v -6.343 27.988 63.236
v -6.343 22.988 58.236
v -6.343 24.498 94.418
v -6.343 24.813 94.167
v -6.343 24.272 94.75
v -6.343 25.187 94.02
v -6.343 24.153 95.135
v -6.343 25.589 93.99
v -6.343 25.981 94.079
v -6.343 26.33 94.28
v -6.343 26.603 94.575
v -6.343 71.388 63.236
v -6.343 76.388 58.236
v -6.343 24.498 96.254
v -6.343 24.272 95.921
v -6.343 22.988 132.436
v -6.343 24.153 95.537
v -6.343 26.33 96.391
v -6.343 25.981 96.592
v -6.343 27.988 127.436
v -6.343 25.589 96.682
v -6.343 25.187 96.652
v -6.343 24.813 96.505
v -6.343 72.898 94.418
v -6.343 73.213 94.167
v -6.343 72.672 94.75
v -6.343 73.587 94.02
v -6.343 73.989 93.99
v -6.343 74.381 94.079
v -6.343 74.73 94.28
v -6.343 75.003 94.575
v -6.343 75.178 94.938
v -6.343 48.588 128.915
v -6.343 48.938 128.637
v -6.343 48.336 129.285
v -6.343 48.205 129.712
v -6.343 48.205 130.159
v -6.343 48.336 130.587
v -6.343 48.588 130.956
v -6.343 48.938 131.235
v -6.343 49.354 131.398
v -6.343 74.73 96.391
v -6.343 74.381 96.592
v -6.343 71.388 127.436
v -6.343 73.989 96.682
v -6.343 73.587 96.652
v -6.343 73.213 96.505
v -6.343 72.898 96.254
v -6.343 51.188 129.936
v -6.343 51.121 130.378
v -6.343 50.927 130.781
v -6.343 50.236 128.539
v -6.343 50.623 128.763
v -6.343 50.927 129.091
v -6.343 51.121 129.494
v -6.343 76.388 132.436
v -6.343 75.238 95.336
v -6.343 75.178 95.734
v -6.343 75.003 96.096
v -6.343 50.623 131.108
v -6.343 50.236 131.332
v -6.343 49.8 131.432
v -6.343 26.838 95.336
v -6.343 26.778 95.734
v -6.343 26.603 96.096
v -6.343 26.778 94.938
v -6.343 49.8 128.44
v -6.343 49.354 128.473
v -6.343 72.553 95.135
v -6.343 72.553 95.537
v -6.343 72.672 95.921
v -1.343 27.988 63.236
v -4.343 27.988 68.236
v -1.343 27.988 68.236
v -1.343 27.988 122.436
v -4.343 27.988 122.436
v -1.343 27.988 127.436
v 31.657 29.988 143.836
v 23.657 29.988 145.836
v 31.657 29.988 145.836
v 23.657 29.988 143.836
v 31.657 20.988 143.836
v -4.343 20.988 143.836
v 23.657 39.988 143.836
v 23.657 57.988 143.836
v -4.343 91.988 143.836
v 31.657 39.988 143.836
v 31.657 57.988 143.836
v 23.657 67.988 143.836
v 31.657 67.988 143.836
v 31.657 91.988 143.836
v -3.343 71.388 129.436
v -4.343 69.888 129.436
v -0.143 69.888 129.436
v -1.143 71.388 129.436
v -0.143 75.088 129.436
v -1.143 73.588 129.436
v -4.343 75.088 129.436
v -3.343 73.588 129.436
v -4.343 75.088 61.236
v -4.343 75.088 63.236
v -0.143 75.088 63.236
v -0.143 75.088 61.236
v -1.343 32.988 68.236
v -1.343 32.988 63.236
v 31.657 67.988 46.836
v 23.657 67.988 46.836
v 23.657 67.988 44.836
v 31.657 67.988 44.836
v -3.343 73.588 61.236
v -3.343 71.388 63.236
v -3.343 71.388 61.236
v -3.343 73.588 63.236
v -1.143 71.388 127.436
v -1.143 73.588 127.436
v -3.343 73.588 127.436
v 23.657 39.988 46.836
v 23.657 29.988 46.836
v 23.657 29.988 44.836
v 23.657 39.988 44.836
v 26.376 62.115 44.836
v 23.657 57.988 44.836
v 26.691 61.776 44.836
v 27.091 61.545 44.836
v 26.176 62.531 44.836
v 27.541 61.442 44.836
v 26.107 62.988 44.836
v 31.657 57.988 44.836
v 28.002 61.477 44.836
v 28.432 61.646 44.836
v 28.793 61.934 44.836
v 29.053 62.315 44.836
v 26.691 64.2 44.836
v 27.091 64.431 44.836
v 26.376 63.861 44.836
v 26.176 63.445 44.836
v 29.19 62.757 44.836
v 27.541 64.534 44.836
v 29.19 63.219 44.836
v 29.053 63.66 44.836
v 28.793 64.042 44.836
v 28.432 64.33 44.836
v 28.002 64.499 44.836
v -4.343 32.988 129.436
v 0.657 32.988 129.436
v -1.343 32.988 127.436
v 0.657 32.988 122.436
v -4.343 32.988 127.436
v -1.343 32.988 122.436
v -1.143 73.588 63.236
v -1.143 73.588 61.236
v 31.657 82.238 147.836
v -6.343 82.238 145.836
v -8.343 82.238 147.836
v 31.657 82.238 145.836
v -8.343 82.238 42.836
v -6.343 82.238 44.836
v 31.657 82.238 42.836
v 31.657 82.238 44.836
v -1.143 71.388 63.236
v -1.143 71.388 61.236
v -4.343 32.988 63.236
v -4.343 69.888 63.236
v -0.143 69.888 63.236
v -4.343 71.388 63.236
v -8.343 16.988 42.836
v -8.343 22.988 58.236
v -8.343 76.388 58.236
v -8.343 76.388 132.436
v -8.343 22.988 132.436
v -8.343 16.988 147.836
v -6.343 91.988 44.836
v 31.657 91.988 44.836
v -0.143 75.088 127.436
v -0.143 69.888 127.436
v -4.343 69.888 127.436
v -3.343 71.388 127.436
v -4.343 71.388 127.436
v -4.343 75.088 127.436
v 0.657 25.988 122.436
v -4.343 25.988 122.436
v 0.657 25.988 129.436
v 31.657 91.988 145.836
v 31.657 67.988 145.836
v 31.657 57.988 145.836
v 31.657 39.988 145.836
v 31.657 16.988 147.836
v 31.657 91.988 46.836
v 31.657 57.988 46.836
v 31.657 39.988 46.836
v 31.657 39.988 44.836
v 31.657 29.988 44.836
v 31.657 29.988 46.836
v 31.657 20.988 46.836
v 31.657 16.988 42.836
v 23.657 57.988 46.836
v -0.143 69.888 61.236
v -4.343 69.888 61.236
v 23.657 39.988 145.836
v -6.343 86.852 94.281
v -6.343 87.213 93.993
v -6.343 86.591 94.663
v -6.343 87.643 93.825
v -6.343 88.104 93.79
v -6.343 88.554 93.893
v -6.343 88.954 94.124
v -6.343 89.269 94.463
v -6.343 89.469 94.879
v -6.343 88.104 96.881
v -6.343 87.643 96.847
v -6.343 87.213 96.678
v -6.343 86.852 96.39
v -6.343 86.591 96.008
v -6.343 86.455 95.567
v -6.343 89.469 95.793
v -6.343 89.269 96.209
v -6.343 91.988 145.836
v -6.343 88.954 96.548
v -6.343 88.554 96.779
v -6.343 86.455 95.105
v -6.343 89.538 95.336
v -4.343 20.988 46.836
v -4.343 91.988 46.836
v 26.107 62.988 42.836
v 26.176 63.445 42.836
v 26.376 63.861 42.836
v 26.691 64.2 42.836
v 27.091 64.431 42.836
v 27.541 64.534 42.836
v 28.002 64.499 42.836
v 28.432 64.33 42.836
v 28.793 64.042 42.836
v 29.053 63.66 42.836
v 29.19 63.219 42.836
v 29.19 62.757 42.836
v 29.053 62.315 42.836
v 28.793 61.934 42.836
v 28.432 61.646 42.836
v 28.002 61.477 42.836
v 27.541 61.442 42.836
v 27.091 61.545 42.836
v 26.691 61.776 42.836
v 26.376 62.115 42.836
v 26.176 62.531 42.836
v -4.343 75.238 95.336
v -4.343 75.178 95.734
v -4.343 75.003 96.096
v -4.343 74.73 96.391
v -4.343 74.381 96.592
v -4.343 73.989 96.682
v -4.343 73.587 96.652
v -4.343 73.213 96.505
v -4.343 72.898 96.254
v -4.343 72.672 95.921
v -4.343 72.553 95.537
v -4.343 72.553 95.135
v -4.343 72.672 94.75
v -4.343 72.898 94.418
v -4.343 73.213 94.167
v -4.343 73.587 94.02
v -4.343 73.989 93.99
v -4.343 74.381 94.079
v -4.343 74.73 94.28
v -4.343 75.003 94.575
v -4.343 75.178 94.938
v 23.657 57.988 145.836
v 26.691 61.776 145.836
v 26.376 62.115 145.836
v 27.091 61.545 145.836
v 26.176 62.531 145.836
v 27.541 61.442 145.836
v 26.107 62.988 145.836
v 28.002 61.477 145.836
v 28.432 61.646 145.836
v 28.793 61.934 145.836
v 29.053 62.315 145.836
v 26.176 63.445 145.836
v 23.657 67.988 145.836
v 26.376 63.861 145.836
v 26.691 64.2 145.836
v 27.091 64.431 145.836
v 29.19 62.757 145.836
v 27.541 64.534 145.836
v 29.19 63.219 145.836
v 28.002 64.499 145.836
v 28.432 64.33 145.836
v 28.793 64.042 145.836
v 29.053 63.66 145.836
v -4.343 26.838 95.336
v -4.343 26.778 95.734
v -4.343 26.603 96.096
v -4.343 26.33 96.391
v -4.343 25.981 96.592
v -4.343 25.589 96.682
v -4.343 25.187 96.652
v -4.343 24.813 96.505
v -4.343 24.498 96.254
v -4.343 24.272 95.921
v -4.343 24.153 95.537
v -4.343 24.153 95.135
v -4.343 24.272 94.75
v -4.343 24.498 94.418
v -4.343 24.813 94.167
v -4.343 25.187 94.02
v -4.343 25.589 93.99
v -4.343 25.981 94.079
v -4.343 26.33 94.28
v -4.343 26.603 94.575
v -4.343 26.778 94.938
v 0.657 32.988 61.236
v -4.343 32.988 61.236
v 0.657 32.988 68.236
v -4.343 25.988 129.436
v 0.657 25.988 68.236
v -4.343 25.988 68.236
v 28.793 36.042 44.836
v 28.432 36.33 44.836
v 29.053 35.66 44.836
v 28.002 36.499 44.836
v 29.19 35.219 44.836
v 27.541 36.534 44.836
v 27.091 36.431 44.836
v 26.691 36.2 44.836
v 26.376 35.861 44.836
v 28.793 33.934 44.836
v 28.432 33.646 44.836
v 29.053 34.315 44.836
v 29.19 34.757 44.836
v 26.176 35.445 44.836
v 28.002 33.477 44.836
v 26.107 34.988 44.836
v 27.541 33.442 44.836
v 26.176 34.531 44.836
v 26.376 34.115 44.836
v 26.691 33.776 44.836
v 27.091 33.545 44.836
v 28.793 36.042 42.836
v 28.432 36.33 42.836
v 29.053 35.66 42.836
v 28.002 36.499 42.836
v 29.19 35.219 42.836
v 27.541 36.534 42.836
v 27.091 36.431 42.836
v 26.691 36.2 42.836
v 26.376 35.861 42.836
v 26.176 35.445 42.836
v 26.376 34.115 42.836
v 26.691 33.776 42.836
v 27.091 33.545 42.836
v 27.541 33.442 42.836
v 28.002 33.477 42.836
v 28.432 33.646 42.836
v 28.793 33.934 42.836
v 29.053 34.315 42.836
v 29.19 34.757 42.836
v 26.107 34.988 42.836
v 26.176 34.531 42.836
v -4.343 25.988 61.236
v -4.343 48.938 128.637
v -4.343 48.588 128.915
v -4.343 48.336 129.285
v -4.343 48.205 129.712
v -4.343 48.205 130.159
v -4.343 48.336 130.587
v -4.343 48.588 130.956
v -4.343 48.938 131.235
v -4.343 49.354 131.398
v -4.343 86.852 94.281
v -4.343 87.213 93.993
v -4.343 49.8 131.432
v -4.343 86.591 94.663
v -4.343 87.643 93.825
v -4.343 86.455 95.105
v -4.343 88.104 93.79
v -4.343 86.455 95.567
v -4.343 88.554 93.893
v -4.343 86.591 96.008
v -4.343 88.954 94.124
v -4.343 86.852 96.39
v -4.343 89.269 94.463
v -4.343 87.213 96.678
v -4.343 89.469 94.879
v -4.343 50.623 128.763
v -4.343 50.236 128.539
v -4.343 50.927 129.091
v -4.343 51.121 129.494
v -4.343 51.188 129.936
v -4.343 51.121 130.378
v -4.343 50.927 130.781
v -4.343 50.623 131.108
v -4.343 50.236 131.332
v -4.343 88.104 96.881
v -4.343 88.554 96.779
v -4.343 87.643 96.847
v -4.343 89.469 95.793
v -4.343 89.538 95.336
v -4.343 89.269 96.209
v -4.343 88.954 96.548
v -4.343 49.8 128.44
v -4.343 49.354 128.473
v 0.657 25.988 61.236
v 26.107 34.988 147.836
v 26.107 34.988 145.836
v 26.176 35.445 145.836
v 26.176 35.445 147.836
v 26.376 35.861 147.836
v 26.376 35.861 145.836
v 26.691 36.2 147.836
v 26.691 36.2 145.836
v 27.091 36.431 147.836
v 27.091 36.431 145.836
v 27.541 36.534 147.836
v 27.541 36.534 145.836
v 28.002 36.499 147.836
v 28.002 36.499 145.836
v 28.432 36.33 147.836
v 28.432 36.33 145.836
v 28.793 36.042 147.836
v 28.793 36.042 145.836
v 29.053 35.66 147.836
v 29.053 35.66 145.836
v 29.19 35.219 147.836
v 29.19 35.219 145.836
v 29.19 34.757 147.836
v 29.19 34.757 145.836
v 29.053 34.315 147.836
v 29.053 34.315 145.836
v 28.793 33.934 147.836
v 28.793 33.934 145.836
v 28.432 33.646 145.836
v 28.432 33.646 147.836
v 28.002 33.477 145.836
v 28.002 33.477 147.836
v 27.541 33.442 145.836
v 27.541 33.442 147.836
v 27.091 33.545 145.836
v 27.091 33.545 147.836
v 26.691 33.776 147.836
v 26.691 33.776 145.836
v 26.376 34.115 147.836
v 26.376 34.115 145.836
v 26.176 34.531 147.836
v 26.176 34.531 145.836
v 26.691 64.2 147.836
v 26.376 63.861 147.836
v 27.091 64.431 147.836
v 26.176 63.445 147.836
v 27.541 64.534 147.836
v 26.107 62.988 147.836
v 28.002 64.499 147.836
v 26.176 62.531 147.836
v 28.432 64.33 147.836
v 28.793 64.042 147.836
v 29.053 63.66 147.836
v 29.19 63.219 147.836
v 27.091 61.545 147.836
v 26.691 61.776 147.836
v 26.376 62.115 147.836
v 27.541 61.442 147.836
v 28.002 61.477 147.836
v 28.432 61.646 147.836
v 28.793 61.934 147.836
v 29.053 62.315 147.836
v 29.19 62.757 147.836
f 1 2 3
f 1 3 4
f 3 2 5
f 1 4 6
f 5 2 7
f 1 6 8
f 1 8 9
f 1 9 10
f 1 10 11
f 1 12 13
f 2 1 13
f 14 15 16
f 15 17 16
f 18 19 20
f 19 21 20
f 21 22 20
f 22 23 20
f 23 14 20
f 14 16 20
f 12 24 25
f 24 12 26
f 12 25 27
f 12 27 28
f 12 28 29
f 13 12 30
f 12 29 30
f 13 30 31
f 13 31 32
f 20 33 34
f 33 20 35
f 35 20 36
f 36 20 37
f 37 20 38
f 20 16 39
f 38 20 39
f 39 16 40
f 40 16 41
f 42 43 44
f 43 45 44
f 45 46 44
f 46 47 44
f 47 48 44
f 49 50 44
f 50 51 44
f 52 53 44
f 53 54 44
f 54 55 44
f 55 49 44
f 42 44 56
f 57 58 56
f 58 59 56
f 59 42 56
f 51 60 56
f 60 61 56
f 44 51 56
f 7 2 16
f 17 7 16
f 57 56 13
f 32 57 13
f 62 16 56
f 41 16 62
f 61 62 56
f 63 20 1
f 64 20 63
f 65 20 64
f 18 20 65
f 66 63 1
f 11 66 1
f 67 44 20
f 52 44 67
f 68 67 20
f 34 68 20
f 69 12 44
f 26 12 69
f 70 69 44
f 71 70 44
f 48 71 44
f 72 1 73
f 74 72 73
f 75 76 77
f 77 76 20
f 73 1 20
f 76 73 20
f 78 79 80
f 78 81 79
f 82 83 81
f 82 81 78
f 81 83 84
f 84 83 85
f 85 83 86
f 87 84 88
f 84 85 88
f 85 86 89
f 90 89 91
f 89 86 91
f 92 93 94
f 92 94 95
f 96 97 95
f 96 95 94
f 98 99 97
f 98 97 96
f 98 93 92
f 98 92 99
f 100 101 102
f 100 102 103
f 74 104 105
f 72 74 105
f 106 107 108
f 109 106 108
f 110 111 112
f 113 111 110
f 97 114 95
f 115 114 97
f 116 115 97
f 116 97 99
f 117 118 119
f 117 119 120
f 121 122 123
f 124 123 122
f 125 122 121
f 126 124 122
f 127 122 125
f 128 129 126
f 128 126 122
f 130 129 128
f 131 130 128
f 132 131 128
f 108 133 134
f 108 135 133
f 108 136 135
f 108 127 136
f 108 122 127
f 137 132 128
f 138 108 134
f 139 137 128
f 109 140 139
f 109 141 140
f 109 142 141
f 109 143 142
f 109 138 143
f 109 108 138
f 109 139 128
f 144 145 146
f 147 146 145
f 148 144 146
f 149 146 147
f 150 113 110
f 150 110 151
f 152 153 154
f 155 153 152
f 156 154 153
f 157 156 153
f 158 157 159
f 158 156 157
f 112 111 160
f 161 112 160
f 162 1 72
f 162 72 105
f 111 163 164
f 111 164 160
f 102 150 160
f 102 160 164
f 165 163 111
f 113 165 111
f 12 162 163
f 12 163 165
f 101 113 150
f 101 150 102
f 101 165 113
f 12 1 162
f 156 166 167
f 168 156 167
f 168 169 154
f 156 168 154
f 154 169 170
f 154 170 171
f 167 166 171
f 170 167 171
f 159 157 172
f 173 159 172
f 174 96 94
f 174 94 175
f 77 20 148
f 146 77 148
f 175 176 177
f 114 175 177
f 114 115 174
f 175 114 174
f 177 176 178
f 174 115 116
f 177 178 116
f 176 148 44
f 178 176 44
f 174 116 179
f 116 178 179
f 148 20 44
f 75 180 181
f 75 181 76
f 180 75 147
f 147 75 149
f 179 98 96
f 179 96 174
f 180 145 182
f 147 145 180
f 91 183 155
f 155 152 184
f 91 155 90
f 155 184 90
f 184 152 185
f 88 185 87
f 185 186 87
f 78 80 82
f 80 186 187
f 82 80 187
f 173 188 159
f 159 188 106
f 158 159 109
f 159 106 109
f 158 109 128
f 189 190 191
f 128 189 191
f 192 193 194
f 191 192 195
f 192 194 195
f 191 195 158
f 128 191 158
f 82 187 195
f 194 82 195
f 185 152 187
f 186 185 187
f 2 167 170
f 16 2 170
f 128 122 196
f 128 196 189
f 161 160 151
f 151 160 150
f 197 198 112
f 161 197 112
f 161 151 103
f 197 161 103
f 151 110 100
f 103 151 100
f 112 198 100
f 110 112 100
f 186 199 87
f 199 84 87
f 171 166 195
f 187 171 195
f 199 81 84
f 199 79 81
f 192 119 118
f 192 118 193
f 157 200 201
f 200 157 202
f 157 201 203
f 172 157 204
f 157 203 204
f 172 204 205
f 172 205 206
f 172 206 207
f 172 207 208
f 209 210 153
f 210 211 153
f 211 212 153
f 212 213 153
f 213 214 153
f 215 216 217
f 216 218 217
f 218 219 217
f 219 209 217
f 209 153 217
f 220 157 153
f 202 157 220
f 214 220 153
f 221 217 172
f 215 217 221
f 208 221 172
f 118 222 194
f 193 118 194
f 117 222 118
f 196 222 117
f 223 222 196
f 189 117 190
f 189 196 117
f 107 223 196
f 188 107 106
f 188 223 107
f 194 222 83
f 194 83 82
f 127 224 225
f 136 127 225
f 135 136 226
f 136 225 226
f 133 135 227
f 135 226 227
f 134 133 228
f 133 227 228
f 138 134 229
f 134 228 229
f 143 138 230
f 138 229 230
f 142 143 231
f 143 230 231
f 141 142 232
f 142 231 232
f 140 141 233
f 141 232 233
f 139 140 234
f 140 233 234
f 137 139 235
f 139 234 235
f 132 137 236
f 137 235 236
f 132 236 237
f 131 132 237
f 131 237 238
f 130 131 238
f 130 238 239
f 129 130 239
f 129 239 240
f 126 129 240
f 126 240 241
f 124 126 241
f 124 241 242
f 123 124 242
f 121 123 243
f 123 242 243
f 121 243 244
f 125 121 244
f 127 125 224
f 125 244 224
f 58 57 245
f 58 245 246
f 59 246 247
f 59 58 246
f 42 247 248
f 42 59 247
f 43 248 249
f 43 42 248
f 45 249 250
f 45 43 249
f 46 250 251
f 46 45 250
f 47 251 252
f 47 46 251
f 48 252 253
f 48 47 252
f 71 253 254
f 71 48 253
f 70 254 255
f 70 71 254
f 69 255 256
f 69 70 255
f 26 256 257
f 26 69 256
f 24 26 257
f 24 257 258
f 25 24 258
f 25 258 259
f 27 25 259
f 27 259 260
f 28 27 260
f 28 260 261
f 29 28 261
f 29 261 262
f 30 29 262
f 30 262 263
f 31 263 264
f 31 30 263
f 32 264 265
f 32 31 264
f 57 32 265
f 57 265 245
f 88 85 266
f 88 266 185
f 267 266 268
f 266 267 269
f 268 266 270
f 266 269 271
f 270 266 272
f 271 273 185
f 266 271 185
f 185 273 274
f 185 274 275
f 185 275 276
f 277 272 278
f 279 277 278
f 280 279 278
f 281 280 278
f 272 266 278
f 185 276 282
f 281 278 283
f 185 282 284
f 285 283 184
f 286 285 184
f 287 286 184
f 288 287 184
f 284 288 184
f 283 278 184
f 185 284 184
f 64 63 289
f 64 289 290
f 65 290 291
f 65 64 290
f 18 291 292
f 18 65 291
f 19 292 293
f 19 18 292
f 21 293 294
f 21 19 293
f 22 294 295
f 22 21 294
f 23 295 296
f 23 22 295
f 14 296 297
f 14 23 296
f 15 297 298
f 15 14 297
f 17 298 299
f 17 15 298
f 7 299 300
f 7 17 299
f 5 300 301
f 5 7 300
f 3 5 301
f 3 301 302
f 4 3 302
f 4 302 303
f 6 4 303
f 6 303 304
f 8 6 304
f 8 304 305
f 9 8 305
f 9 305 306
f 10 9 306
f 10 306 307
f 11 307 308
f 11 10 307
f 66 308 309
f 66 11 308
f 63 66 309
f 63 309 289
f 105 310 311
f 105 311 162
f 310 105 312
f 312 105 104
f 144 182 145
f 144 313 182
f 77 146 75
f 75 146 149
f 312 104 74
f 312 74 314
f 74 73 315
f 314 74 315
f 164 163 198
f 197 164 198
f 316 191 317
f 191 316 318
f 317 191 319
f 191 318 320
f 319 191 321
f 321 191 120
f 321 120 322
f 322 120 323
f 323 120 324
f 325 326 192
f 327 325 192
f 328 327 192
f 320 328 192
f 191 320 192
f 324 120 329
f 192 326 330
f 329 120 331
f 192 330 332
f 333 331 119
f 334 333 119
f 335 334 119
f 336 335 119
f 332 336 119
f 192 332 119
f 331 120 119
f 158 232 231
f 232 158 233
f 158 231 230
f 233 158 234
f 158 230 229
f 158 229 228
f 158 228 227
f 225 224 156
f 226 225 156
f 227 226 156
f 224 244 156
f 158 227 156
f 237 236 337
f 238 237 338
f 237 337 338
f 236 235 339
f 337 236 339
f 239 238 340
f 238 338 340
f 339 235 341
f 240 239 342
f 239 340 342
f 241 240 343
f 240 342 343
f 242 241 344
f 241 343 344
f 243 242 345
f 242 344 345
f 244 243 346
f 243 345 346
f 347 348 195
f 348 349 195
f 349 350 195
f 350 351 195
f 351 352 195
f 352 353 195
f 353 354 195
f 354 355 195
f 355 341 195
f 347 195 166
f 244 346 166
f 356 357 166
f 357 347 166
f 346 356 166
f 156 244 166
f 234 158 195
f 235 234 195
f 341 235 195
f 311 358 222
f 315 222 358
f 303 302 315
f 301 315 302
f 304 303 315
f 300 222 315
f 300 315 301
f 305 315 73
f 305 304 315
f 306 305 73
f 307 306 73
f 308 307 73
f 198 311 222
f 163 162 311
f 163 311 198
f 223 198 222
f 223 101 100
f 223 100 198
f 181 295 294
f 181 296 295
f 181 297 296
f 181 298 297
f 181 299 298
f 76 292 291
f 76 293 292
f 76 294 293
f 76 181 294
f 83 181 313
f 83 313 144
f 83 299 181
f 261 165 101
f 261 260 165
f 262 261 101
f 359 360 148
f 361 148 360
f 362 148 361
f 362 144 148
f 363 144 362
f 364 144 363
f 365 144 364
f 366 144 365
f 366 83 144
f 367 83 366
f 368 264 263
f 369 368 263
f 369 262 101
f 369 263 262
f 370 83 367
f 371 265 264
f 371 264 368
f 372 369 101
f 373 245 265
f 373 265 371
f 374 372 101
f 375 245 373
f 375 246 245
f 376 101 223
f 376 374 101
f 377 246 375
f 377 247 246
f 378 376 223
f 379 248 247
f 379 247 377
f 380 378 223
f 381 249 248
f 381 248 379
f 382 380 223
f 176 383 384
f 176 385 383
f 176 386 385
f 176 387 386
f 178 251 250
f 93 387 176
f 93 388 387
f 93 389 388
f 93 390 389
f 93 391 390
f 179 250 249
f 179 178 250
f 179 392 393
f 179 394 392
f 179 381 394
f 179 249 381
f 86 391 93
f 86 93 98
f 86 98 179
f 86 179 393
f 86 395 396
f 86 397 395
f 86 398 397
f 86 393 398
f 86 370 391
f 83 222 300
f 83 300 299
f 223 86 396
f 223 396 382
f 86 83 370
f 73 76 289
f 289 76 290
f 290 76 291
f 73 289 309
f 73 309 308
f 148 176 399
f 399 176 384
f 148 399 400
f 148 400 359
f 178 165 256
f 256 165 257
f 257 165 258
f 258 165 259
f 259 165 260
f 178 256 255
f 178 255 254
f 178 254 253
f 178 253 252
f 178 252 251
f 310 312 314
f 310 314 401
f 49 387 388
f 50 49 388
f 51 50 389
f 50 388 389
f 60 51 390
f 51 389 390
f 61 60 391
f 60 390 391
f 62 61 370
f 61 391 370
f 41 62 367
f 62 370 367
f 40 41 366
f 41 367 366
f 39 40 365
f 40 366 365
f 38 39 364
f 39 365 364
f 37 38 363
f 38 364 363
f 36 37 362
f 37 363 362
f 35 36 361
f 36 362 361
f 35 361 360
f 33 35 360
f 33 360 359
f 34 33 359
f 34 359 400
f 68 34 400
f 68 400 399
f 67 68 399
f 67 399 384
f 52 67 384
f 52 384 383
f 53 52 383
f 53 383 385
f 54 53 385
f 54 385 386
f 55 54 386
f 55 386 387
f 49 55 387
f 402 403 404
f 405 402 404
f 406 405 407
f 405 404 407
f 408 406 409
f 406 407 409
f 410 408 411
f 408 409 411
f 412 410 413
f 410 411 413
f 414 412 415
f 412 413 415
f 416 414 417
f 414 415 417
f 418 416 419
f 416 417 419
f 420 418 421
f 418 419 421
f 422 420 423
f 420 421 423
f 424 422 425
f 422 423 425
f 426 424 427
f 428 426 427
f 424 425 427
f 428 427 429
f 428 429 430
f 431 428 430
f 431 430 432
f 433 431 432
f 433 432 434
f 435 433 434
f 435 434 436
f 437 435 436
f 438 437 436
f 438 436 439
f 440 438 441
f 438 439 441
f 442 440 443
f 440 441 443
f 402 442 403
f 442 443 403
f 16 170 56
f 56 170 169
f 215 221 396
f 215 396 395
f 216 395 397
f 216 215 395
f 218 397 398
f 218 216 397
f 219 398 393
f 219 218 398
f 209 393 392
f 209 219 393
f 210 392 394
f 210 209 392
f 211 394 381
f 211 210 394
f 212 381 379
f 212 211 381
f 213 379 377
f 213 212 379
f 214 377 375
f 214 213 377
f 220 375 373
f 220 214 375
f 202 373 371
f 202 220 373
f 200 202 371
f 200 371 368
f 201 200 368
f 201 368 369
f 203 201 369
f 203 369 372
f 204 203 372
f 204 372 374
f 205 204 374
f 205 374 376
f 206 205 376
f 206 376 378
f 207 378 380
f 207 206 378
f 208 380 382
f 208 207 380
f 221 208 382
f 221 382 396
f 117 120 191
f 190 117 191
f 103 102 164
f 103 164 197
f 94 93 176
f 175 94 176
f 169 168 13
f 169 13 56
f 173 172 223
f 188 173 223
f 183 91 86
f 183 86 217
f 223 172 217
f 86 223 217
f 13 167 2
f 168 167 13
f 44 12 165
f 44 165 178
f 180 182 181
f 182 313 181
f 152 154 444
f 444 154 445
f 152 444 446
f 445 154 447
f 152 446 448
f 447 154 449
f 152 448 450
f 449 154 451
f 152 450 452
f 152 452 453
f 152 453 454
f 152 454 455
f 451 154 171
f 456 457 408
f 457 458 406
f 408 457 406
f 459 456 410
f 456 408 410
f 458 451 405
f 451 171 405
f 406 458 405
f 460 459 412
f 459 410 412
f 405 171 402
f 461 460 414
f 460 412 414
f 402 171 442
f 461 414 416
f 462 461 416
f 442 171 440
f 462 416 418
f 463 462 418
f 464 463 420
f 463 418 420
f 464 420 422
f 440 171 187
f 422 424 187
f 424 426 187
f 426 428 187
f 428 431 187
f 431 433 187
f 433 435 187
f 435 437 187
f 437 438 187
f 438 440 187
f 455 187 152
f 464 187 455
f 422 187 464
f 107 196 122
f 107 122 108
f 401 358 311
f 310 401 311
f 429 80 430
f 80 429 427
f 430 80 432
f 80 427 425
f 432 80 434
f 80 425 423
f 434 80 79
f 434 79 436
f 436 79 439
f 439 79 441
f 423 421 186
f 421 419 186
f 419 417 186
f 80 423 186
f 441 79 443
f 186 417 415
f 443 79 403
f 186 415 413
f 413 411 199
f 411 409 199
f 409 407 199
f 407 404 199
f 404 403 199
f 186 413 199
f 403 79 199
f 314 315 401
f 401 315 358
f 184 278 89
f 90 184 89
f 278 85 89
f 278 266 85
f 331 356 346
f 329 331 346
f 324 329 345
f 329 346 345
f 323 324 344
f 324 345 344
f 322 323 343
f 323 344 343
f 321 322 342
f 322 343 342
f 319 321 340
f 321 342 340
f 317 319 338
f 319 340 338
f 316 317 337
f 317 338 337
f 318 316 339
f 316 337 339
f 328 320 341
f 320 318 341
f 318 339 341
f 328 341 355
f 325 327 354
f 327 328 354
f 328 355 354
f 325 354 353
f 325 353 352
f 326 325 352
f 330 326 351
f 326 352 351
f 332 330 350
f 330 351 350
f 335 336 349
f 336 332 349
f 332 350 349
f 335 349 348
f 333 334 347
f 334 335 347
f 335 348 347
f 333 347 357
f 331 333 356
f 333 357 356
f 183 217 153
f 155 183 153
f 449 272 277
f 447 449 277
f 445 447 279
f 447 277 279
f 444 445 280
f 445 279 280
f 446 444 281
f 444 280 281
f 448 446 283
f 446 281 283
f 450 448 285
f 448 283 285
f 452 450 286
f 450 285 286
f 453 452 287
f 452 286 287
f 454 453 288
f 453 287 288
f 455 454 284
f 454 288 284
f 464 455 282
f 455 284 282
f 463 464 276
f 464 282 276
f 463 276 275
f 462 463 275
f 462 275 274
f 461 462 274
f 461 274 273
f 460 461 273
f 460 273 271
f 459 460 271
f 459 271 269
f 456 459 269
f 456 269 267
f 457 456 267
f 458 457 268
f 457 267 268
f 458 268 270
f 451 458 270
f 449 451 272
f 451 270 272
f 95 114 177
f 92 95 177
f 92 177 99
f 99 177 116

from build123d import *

# Parameters (mm, degrees)
COMBINE1_START         = -8.34304364
COMBINE1_DEPTH         = 32
COMBINE1_START_2       = -6.34304364
COMBINE1_2_OUTLINE_R   = 1.35
COMBINE1_2_OUTLINE_W   = 43.4
COMBINE1_2_OUTLINE_H   = 64.2
COMBINE1_2_OUTLINE_R_2 = 1.55
COMBINE1_2_DEPTH       = 2
COMBINE1_3_OUTLINE_W   = 61.2
COMBINE1_3_OUTLINE_H   = 97
COMBINE1_3_OUTLINE_W_2 = 53.4
COMBINE1_3_OUTLINE_H_2 = 74.2
COMBINE1_3_DEPTH       = 2
COMBINE1_START_3       = -4.34304364
COMBINE1_4_DEPTH       = 30.4499999
COMBINE1_START_4       = 29.20695646
COMBINE1_5_DEPTH       = 2.4499999
COMBINE1_START_5       = 23.65695636
COMBINE1_6_OUTLINE_W   = 9.8
COMBINE1_6_OUTLINE_H   = 2
COMBINE1_6_DEPTH       = 8
COMBINE1_START_6       = 42.835743365
COMBINE1_7_OUTLINE_W   = 3.1000002
COMBINE1_7_OUTLINE_H   = 4
COMBINE1_7_DEPTH       = 105
COMBINE1_8_OUTLINE_W   = 3.1000002
COMBINE1_8_OUTLINE_H   = 18
COMBINE1_8_OUTLINE_H_2 = 14.2
COMBINE1_8_OUTLINE_H_3 = 9
COMBINE1_8_DEPTH       = 4
COMBINE1_START_7       = 143.835743365
COMBINE1_9_OUTLINE_W   = 3.1000002
COMBINE1_9_OUTLINE_H   = 18
COMBINE1_9_OUTLINE_H_2 = 14.2
COMBINE1_9_OUTLINE_H_3 = 9
COMBINE1_9_DEPTH       = 4
COMBINE1_10_DEPTH      = 2
COMBINE1_START_8       = 145.835743365
COMBINE1_11_DEPTH      = 2
CUT_EXTRUDE1_REACH     = 179.801
SKETCH2_R              = 1.5
BOSS_EXTRUDE1_DEPTH    = 3
SKETCH4_W              = 7
SKETCH4_H              = 7
BOSS_EXTRUDE2_DEPTH    = 2
SKETCH5_W              = 2
SKETCH5_H              = 5.2
BOSS_EXTRUDE3_DEPTH    = 4.2
CUT_EXTRUDE2_REACH     = 130.923
SKETCH6_W              = 2.2
SKETCH6_H              = 2.2
CUT_EXTRUDE3_REACH     = 130.923
SKETCH7_W              = 2.2
SKETCH7_H              = 2.2
SKETCH8_W              = 2
SKETCH8_H              = 101
BOSS_EXTRUDE4_DEPTH    = 0.05


with BuildPart() as part:
    # Combine1: read off the stored shape, not the designer's step
    # Combine1 outline → Combine1 (new body)
    with BuildSketch(Plane.YZ.offset(COMBINE1_START)):
        Polygon((82.18784428, 42.835743365), (82.18784428, 46.835743365), (20.98784428, 46.835743365), (20.98784428, 143.835743365), (82.18784428, 143.835743365), (82.18784428, 147.835743365), (16.98784428, 147.835743365), (16.98784428, 42.835743365), align=None)
    extrude(amount=COMBINE1_DEPTH)

    # Combine1 2 outline → Combine1 2 (add)
    with BuildSketch(Plane.YZ.offset(COMBINE1_START_2)):
        Polygon((82.18784428, 46.835743365), (82.18784428, 44.835743365), (91.98784428, 44.835743365), (91.98784428, 145.835743365), (82.18784428, 145.835743365), (82.18784428, 143.835743365), (20.98784428, 143.835743365), (20.98784428, 46.835743365), align=None)
        with Locations((25.48784428, 95.335743365)):
            Circle(COMBINE1_2_OUTLINE_R, mode=Mode.SUBTRACT)
        with Locations((49.68784428, 95.335743365)):
            Rectangle(COMBINE1_2_OUTLINE_W, COMBINE1_2_OUTLINE_H, mode=Mode.SUBTRACT)
        with Locations((73.88784428, 95.335743365)):
            Circle(COMBINE1_2_OUTLINE_R, mode=Mode.SUBTRACT)
        with Locations((87.98784428, 95.335743365)):
            Circle(COMBINE1_2_OUTLINE_R_2, mode=Mode.SUBTRACT)
    extrude(amount=COMBINE1_2_DEPTH)

    # Combine1 3 outline → Combine1 3 (add)
    with BuildSketch(Plane.YZ.offset(COMBINE1_START)):
        with Locations((51.58784428, 95.335743365)):
            Rectangle(COMBINE1_3_OUTLINE_W, COMBINE1_3_OUTLINE_H)
        with Locations((49.68784428, 95.335743365)):
            Rectangle(COMBINE1_3_OUTLINE_W_2, COMBINE1_3_OUTLINE_H_2, mode=Mode.SUBTRACT)
    extrude(amount=COMBINE1_3_DEPTH)

    # Combine1 4 outline → Combine1 4 (add)
    with BuildSketch(Plane.YZ.offset(COMBINE1_START_3)):
        Polygon((82.18784428, 44.835743365), (91.98784428, 44.835743365), (91.98784428, 46.835743365), (67.98784428, 46.835743365), (67.98784428, 44.835743365), (57.98784428, 44.835743365), (57.98784428, 46.835743365), (39.98784428, 46.835743365), (39.98784428, 44.835743365), (29.98784428, 44.835743365), (29.98784428, 46.835743365), (20.98784428, 46.835743365), (20.98784428, 143.835743365), (29.98784428, 143.835743365), (29.98784428, 145.835743365), (39.98784428, 145.835743365), (39.98784428, 143.835743365), (57.98784428, 143.835743365), (57.98784428, 145.835743365), (67.98784428, 145.835743365), (67.98784428, 143.835743365), (91.98784428, 143.835743365), (91.98784428, 145.835743365), (82.18784428, 145.835743365), (82.18784428, 147.835743365), (16.98784428, 147.835743365), (16.98784428, 42.835743365), (82.18784428, 42.835743365), align=None)
    extrude(amount=COMBINE1_4_DEPTH)



with BuildPart() as body_2:
    # Combine1 5 outline → Combine1 5 (new body)
    with BuildSketch(Plane.YZ.offset(COMBINE1_START_4)):
        Polygon((82.18784428, 44.835743365), (91.98784428, 44.835743365), (91.98784428, 46.835743365), (67.98784428, 46.835743365), (67.98784428, 44.835743365), (57.98784428, 44.835743365), (57.98784428, 46.835743365), (39.98784428, 46.835743365), (39.98784428, 44.835743365), (29.98784428, 44.835743365), (29.98784428, 46.835743365), (20.98784428, 46.835743365), (20.98784428, 143.835743365), (29.98784428, 143.835743365), (29.98784428, 145.835743365), (39.98784428, 145.835743365), (39.98784428, 143.835743365), (57.98784428, 143.835743365), (57.98784428, 145.835743365), (67.98784428, 145.835743365), (67.98784428, 143.835743365), (91.98784428, 143.835743365), (91.98784428, 145.835743365), (82.18784428, 145.835743365), (82.18784428, 147.835743365), (16.98784428, 147.835743365), (16.98784428, 42.835743365), (82.18784428, 42.835743365), align=None)
    extrude(amount=COMBINE1_5_DEPTH)


with BuildPart() as part_1:
    add(part.part)

    add(body_2.part)  # Combine1 6 merges body 2
    # Combine1 6 outline → Combine1 6 (add)
    with BuildSketch(Plane.YZ.offset(COMBINE1_START_5)):
        with Locations((87.08784428, 45.835743365)):
            Rectangle(COMBINE1_6_OUTLINE_W, COMBINE1_6_OUTLINE_H)
        with Locations((87.08784428, 144.835743365)):
            Rectangle(COMBINE1_6_OUTLINE_W, COMBINE1_6_OUTLINE_H)
    extrude(amount=COMBINE1_6_DEPTH)

    # Combine1 7 outline → Combine1 7 (add)
    with BuildSketch(Plane.XY.offset(COMBINE1_START_6)):
        with Locations((27.65695636, 18.98784428)):
            Rectangle(COMBINE1_7_OUTLINE_W, COMBINE1_7_OUTLINE_H)
    extrude(amount=COMBINE1_7_DEPTH)

    # Combine1 8 outline → Combine1 8 (add)
    with BuildSketch(Plane.XY.offset(COMBINE1_START_6)):
        with Locations((27.65695636, 48.98784428)):
            Rectangle(COMBINE1_8_OUTLINE_W, COMBINE1_8_OUTLINE_H)
        with Locations((27.65695636, 75.08784428)):
            Rectangle(COMBINE1_8_OUTLINE_W, COMBINE1_8_OUTLINE_H_2)
        with Locations((27.65695636, 25.48784428)):
            Rectangle(COMBINE1_8_OUTLINE_W, COMBINE1_8_OUTLINE_H_3)
    extrude(amount=COMBINE1_8_DEPTH)

    # Combine1 9 outline → Combine1 9 (add)
    with BuildSketch(Plane.XY.offset(COMBINE1_START_7)):
        with Locations((27.65695636, 48.98784428)):
            Rectangle(COMBINE1_9_OUTLINE_W, COMBINE1_9_OUTLINE_H)
        with Locations((27.65695636, 75.08784428)):
            Rectangle(COMBINE1_9_OUTLINE_W, COMBINE1_9_OUTLINE_H_2)
        with Locations((27.65695636, 25.48784428)):
            Rectangle(COMBINE1_9_OUTLINE_W, COMBINE1_9_OUTLINE_H_3)
    extrude(amount=COMBINE1_9_DEPTH)

    # Combine1 10 outline → Combine1 10 (add)
    with BuildSketch(Plane.XY.offset(COMBINE1_START_6)):
        with BuildLine():
            Line((29.20695646, 57.98784428), (29.20695636, 62.98784428))
            ThreePointArc((29.20695636, 62.98784428), (27.656956333, 61.43784428), (26.10695636, 62.987844335))
            Line((26.10695636, 62.987844335), (26.10695626, 57.98784428))
            Line((26.10695626, 57.98784428), (29.20695646, 57.98784428))
        make_face()
        with BuildLine():
            ThreePointArc((26.10695636, 62.987844335), (27.656956387, 64.53784428), (29.20695636, 62.98784428))
            Line((29.20695636, 62.98784428), (29.20695646, 67.98784428))
            Line((29.20695646, 67.98784428), (26.10695626, 67.98784428))
            Line((26.10695626, 67.98784428), (26.10695636, 62.987844335))
        make_face()
        with BuildLine():
            Line((29.20695636, 34.98784428), (29.20695646, 39.98784428))
            Line((29.20695646, 39.98784428), (26.10695626, 39.98784428))
            Line((26.10695626, 39.98784428), (26.10695636, 34.98784428))
            ThreePointArc((26.10695636, 34.98784428), (27.65695636, 36.53784428), (29.20695636, 34.98784428))
        make_face()
        with BuildLine():
            Line((29.20695646, 29.98784428), (29.20695636, 34.98784428))
            ThreePointArc((29.20695636, 34.98784428), (27.65695636, 33.43784428), (26.10695636, 34.98784428))
            Line((26.10695636, 34.98784428), (26.10695626, 29.98784428))
            Line((26.10695626, 29.98784428), (29.20695646, 29.98784428))
        make_face()
    extrude(amount=COMBINE1_10_DEPTH)

    # Combine1 11 outline → Combine1 11 (add)
    with BuildSketch(Plane.XY.offset(COMBINE1_START_8)):
        with BuildLine():
            Line((29.20695646, 57.98784428), (29.20695636, 62.98784428))
            ThreePointArc((29.20695636, 62.98784428), (27.656956333, 61.43784428), (26.10695636, 62.987844335))
            Line((26.10695636, 62.987844335), (26.10695626, 57.98784428))
            Line((26.10695626, 57.98784428), (29.20695646, 57.98784428))
        make_face()
        with BuildLine():
            ThreePointArc((26.10695636, 62.987844335), (27.656956387, 64.53784428), (29.20695636, 62.98784428))
            Line((29.20695636, 62.98784428), (29.20695646, 67.98784428))
            Line((29.20695646, 67.98784428), (26.10695626, 67.98784428))
            Line((26.10695626, 67.98784428), (26.10695636, 62.987844335))
        make_face()
        with BuildLine():
            Line((29.20695636, 34.98784428), (29.20695646, 39.98784428))
            Line((29.20695646, 39.98784428), (26.10695626, 39.98784428))
            Line((26.10695626, 39.98784428), (26.10695636, 34.98784428))
            ThreePointArc((26.10695636, 34.98784428), (27.65695636, 36.53784428), (29.20695636, 34.98784428))
        make_face()
        with BuildLine():
            Line((29.20695646, 29.98784428), (29.20695636, 34.98784428))
            ThreePointArc((29.20695636, 34.98784428), (27.65695636, 33.43784428), (26.10695636, 34.98784428))
            Line((26.10695636, 34.98784428), (26.10695626, 29.98784428))
            Line((26.10695626, 29.98784428), (29.20695646, 29.98784428))
        make_face()
    extrude(amount=COMBINE1_11_DEPTH)

    # Sketch2 → Cut-Extrude1 (cut, up to next)
    with BuildSketch(Plane(origin=(-4.34304364, 0, 0), x_dir=(0, 0, -1), z_dir=(1, 0, 0)), mode=Mode.PRIVATE) as cut_extrude1_sk1:
        with Locations(Location((-129.935743365, 49.68784428, 0), (0, 0, 90))):
            Circle(SKETCH2_R)
    cut_extrude1_tool1 = extrude(cut_extrude1_sk1.sketch, amount=-CUT_EXTRUDE1_REACH, mode=Mode.PRIVATE) & part_1.part
    add(cut_extrude1_tool1.solids().sort_by_distance((-4.343044, 49.687844, 129.935743))[0], mode=Mode.SUBTRACT)

    # Sketch3 → Boss-Extrude1 (add)
    with BuildSketch(Plane(origin=(-4.34304364, 0, 0), x_dir=(0, 0, -1), z_dir=(1, 0, 0))):
        Polygon((-127.435743365, 27.98784428), (-127.435743365, 32.98784428), (-129.435743365, 32.98784428), (-129.435743365, 27.98784428), (-129.435743365, 25.98784428), (-122.435743365, 25.98784428), (-122.435743365, 27.98784428), align=None)
        Polygon((-63.235743365, 27.98784428), (-68.235743365, 27.98784428), (-68.235743365, 25.98784428), (-61.235743365, 25.98784428), (-61.235743365, 27.98784428), (-61.235743365, 32.98784428), (-63.235743365, 32.98784428), align=None)
    extrude(amount=BOSS_EXTRUDE1_DEPTH)

    # Sketch4 → Boss-Extrude2 (add)
    with BuildSketch(Plane(origin=(-1.34304364, 0, 0), x_dir=(0, 0, -1), z_dir=(1, 0, 0))):
        with Locations((-125.935743365, 29.48784428)):
            Rectangle(SKETCH4_W, SKETCH4_H)
        with Locations((-64.735743365, 29.48784428)):
            Rectangle(SKETCH4_W, SKETCH4_H)
    extrude(amount=BOSS_EXTRUDE2_DEPTH)

    # Sketch5 → Boss-Extrude3 (add)
    with BuildSketch(Plane(origin=(-4.34304364, 0, 0), x_dir=(0, 0, -1), z_dir=(1, 0, 0))):
        with Locations((-128.435743365, 72.48784428)):
            Rectangle(SKETCH5_W, SKETCH5_H)
        with Locations((-62.235743365, 72.48784428)):
            Rectangle(SKETCH5_W, SKETCH5_H)
    extrude(amount=BOSS_EXTRUDE3_DEPTH)

    # Sketch6 → Cut-Extrude2 (cut, up to next)
    with BuildSketch(Plane.XY.offset(63.235743365), mode=Mode.PRIVATE) as cut_extrude2_sk1:
        with Locations((-2.24304364, 72.48784428)):
            Rectangle(SKETCH6_W, SKETCH6_H)
    cut_extrude2_tool1 = extrude(cut_extrude2_sk1.sketch, amount=-CUT_EXTRUDE2_REACH, mode=Mode.PRIVATE) & part_1.part
    add(cut_extrude2_tool1.solids().sort_by_distance((-2.243044, 72.487844, 63.235743))[0], mode=Mode.SUBTRACT)

    # Sketch7 → Cut-Extrude3 (cut, up to next)
    with BuildSketch(Plane(origin=(0, 0, 127.435743365), x_dir=(-1, 0, 0), z_dir=(0, 0, -1)), mode=Mode.PRIVATE) as cut_extrude3_sk1:
        with Locations((2.24304364, 72.48784428)):
            Rectangle(SKETCH7_W, SKETCH7_H)
    cut_extrude3_tool1 = extrude(cut_extrude3_sk1.sketch, amount=-CUT_EXTRUDE3_REACH, mode=Mode.PRIVATE) & part_1.part
    add(cut_extrude3_tool1.solids().sort_by_distance((-2.243044, 72.487844, 127.435743))[0], mode=Mode.SUBTRACT)

    # Sketch8 → Boss-Extrude4 (add)
    with BuildSketch(Plane(origin=(0, 82.18784428, 0), x_dir=(1, 0, 0), z_dir=(0, 1, 0))):
        Polygon((31.65695636, -42.835743365), (-8.34304364, -42.835743365), (-8.34304364, -44.835743365), (-6.34304364, -44.835743365), (31.65695636, -44.835743365), align=None)
        with Locations((-7.34304364, -95.335743365)):
            Rectangle(SKETCH8_W, SKETCH8_H)
        Polygon((-6.34304364, -145.835743365), (-8.34304364, -145.835743365), (-8.34304364, -147.835743365), (31.65695636, -147.835743365), (31.65695636, -145.835743365), align=None)
    extrude(amount=BOSS_EXTRUDE4_DEPTH)


solid = part_1.part
